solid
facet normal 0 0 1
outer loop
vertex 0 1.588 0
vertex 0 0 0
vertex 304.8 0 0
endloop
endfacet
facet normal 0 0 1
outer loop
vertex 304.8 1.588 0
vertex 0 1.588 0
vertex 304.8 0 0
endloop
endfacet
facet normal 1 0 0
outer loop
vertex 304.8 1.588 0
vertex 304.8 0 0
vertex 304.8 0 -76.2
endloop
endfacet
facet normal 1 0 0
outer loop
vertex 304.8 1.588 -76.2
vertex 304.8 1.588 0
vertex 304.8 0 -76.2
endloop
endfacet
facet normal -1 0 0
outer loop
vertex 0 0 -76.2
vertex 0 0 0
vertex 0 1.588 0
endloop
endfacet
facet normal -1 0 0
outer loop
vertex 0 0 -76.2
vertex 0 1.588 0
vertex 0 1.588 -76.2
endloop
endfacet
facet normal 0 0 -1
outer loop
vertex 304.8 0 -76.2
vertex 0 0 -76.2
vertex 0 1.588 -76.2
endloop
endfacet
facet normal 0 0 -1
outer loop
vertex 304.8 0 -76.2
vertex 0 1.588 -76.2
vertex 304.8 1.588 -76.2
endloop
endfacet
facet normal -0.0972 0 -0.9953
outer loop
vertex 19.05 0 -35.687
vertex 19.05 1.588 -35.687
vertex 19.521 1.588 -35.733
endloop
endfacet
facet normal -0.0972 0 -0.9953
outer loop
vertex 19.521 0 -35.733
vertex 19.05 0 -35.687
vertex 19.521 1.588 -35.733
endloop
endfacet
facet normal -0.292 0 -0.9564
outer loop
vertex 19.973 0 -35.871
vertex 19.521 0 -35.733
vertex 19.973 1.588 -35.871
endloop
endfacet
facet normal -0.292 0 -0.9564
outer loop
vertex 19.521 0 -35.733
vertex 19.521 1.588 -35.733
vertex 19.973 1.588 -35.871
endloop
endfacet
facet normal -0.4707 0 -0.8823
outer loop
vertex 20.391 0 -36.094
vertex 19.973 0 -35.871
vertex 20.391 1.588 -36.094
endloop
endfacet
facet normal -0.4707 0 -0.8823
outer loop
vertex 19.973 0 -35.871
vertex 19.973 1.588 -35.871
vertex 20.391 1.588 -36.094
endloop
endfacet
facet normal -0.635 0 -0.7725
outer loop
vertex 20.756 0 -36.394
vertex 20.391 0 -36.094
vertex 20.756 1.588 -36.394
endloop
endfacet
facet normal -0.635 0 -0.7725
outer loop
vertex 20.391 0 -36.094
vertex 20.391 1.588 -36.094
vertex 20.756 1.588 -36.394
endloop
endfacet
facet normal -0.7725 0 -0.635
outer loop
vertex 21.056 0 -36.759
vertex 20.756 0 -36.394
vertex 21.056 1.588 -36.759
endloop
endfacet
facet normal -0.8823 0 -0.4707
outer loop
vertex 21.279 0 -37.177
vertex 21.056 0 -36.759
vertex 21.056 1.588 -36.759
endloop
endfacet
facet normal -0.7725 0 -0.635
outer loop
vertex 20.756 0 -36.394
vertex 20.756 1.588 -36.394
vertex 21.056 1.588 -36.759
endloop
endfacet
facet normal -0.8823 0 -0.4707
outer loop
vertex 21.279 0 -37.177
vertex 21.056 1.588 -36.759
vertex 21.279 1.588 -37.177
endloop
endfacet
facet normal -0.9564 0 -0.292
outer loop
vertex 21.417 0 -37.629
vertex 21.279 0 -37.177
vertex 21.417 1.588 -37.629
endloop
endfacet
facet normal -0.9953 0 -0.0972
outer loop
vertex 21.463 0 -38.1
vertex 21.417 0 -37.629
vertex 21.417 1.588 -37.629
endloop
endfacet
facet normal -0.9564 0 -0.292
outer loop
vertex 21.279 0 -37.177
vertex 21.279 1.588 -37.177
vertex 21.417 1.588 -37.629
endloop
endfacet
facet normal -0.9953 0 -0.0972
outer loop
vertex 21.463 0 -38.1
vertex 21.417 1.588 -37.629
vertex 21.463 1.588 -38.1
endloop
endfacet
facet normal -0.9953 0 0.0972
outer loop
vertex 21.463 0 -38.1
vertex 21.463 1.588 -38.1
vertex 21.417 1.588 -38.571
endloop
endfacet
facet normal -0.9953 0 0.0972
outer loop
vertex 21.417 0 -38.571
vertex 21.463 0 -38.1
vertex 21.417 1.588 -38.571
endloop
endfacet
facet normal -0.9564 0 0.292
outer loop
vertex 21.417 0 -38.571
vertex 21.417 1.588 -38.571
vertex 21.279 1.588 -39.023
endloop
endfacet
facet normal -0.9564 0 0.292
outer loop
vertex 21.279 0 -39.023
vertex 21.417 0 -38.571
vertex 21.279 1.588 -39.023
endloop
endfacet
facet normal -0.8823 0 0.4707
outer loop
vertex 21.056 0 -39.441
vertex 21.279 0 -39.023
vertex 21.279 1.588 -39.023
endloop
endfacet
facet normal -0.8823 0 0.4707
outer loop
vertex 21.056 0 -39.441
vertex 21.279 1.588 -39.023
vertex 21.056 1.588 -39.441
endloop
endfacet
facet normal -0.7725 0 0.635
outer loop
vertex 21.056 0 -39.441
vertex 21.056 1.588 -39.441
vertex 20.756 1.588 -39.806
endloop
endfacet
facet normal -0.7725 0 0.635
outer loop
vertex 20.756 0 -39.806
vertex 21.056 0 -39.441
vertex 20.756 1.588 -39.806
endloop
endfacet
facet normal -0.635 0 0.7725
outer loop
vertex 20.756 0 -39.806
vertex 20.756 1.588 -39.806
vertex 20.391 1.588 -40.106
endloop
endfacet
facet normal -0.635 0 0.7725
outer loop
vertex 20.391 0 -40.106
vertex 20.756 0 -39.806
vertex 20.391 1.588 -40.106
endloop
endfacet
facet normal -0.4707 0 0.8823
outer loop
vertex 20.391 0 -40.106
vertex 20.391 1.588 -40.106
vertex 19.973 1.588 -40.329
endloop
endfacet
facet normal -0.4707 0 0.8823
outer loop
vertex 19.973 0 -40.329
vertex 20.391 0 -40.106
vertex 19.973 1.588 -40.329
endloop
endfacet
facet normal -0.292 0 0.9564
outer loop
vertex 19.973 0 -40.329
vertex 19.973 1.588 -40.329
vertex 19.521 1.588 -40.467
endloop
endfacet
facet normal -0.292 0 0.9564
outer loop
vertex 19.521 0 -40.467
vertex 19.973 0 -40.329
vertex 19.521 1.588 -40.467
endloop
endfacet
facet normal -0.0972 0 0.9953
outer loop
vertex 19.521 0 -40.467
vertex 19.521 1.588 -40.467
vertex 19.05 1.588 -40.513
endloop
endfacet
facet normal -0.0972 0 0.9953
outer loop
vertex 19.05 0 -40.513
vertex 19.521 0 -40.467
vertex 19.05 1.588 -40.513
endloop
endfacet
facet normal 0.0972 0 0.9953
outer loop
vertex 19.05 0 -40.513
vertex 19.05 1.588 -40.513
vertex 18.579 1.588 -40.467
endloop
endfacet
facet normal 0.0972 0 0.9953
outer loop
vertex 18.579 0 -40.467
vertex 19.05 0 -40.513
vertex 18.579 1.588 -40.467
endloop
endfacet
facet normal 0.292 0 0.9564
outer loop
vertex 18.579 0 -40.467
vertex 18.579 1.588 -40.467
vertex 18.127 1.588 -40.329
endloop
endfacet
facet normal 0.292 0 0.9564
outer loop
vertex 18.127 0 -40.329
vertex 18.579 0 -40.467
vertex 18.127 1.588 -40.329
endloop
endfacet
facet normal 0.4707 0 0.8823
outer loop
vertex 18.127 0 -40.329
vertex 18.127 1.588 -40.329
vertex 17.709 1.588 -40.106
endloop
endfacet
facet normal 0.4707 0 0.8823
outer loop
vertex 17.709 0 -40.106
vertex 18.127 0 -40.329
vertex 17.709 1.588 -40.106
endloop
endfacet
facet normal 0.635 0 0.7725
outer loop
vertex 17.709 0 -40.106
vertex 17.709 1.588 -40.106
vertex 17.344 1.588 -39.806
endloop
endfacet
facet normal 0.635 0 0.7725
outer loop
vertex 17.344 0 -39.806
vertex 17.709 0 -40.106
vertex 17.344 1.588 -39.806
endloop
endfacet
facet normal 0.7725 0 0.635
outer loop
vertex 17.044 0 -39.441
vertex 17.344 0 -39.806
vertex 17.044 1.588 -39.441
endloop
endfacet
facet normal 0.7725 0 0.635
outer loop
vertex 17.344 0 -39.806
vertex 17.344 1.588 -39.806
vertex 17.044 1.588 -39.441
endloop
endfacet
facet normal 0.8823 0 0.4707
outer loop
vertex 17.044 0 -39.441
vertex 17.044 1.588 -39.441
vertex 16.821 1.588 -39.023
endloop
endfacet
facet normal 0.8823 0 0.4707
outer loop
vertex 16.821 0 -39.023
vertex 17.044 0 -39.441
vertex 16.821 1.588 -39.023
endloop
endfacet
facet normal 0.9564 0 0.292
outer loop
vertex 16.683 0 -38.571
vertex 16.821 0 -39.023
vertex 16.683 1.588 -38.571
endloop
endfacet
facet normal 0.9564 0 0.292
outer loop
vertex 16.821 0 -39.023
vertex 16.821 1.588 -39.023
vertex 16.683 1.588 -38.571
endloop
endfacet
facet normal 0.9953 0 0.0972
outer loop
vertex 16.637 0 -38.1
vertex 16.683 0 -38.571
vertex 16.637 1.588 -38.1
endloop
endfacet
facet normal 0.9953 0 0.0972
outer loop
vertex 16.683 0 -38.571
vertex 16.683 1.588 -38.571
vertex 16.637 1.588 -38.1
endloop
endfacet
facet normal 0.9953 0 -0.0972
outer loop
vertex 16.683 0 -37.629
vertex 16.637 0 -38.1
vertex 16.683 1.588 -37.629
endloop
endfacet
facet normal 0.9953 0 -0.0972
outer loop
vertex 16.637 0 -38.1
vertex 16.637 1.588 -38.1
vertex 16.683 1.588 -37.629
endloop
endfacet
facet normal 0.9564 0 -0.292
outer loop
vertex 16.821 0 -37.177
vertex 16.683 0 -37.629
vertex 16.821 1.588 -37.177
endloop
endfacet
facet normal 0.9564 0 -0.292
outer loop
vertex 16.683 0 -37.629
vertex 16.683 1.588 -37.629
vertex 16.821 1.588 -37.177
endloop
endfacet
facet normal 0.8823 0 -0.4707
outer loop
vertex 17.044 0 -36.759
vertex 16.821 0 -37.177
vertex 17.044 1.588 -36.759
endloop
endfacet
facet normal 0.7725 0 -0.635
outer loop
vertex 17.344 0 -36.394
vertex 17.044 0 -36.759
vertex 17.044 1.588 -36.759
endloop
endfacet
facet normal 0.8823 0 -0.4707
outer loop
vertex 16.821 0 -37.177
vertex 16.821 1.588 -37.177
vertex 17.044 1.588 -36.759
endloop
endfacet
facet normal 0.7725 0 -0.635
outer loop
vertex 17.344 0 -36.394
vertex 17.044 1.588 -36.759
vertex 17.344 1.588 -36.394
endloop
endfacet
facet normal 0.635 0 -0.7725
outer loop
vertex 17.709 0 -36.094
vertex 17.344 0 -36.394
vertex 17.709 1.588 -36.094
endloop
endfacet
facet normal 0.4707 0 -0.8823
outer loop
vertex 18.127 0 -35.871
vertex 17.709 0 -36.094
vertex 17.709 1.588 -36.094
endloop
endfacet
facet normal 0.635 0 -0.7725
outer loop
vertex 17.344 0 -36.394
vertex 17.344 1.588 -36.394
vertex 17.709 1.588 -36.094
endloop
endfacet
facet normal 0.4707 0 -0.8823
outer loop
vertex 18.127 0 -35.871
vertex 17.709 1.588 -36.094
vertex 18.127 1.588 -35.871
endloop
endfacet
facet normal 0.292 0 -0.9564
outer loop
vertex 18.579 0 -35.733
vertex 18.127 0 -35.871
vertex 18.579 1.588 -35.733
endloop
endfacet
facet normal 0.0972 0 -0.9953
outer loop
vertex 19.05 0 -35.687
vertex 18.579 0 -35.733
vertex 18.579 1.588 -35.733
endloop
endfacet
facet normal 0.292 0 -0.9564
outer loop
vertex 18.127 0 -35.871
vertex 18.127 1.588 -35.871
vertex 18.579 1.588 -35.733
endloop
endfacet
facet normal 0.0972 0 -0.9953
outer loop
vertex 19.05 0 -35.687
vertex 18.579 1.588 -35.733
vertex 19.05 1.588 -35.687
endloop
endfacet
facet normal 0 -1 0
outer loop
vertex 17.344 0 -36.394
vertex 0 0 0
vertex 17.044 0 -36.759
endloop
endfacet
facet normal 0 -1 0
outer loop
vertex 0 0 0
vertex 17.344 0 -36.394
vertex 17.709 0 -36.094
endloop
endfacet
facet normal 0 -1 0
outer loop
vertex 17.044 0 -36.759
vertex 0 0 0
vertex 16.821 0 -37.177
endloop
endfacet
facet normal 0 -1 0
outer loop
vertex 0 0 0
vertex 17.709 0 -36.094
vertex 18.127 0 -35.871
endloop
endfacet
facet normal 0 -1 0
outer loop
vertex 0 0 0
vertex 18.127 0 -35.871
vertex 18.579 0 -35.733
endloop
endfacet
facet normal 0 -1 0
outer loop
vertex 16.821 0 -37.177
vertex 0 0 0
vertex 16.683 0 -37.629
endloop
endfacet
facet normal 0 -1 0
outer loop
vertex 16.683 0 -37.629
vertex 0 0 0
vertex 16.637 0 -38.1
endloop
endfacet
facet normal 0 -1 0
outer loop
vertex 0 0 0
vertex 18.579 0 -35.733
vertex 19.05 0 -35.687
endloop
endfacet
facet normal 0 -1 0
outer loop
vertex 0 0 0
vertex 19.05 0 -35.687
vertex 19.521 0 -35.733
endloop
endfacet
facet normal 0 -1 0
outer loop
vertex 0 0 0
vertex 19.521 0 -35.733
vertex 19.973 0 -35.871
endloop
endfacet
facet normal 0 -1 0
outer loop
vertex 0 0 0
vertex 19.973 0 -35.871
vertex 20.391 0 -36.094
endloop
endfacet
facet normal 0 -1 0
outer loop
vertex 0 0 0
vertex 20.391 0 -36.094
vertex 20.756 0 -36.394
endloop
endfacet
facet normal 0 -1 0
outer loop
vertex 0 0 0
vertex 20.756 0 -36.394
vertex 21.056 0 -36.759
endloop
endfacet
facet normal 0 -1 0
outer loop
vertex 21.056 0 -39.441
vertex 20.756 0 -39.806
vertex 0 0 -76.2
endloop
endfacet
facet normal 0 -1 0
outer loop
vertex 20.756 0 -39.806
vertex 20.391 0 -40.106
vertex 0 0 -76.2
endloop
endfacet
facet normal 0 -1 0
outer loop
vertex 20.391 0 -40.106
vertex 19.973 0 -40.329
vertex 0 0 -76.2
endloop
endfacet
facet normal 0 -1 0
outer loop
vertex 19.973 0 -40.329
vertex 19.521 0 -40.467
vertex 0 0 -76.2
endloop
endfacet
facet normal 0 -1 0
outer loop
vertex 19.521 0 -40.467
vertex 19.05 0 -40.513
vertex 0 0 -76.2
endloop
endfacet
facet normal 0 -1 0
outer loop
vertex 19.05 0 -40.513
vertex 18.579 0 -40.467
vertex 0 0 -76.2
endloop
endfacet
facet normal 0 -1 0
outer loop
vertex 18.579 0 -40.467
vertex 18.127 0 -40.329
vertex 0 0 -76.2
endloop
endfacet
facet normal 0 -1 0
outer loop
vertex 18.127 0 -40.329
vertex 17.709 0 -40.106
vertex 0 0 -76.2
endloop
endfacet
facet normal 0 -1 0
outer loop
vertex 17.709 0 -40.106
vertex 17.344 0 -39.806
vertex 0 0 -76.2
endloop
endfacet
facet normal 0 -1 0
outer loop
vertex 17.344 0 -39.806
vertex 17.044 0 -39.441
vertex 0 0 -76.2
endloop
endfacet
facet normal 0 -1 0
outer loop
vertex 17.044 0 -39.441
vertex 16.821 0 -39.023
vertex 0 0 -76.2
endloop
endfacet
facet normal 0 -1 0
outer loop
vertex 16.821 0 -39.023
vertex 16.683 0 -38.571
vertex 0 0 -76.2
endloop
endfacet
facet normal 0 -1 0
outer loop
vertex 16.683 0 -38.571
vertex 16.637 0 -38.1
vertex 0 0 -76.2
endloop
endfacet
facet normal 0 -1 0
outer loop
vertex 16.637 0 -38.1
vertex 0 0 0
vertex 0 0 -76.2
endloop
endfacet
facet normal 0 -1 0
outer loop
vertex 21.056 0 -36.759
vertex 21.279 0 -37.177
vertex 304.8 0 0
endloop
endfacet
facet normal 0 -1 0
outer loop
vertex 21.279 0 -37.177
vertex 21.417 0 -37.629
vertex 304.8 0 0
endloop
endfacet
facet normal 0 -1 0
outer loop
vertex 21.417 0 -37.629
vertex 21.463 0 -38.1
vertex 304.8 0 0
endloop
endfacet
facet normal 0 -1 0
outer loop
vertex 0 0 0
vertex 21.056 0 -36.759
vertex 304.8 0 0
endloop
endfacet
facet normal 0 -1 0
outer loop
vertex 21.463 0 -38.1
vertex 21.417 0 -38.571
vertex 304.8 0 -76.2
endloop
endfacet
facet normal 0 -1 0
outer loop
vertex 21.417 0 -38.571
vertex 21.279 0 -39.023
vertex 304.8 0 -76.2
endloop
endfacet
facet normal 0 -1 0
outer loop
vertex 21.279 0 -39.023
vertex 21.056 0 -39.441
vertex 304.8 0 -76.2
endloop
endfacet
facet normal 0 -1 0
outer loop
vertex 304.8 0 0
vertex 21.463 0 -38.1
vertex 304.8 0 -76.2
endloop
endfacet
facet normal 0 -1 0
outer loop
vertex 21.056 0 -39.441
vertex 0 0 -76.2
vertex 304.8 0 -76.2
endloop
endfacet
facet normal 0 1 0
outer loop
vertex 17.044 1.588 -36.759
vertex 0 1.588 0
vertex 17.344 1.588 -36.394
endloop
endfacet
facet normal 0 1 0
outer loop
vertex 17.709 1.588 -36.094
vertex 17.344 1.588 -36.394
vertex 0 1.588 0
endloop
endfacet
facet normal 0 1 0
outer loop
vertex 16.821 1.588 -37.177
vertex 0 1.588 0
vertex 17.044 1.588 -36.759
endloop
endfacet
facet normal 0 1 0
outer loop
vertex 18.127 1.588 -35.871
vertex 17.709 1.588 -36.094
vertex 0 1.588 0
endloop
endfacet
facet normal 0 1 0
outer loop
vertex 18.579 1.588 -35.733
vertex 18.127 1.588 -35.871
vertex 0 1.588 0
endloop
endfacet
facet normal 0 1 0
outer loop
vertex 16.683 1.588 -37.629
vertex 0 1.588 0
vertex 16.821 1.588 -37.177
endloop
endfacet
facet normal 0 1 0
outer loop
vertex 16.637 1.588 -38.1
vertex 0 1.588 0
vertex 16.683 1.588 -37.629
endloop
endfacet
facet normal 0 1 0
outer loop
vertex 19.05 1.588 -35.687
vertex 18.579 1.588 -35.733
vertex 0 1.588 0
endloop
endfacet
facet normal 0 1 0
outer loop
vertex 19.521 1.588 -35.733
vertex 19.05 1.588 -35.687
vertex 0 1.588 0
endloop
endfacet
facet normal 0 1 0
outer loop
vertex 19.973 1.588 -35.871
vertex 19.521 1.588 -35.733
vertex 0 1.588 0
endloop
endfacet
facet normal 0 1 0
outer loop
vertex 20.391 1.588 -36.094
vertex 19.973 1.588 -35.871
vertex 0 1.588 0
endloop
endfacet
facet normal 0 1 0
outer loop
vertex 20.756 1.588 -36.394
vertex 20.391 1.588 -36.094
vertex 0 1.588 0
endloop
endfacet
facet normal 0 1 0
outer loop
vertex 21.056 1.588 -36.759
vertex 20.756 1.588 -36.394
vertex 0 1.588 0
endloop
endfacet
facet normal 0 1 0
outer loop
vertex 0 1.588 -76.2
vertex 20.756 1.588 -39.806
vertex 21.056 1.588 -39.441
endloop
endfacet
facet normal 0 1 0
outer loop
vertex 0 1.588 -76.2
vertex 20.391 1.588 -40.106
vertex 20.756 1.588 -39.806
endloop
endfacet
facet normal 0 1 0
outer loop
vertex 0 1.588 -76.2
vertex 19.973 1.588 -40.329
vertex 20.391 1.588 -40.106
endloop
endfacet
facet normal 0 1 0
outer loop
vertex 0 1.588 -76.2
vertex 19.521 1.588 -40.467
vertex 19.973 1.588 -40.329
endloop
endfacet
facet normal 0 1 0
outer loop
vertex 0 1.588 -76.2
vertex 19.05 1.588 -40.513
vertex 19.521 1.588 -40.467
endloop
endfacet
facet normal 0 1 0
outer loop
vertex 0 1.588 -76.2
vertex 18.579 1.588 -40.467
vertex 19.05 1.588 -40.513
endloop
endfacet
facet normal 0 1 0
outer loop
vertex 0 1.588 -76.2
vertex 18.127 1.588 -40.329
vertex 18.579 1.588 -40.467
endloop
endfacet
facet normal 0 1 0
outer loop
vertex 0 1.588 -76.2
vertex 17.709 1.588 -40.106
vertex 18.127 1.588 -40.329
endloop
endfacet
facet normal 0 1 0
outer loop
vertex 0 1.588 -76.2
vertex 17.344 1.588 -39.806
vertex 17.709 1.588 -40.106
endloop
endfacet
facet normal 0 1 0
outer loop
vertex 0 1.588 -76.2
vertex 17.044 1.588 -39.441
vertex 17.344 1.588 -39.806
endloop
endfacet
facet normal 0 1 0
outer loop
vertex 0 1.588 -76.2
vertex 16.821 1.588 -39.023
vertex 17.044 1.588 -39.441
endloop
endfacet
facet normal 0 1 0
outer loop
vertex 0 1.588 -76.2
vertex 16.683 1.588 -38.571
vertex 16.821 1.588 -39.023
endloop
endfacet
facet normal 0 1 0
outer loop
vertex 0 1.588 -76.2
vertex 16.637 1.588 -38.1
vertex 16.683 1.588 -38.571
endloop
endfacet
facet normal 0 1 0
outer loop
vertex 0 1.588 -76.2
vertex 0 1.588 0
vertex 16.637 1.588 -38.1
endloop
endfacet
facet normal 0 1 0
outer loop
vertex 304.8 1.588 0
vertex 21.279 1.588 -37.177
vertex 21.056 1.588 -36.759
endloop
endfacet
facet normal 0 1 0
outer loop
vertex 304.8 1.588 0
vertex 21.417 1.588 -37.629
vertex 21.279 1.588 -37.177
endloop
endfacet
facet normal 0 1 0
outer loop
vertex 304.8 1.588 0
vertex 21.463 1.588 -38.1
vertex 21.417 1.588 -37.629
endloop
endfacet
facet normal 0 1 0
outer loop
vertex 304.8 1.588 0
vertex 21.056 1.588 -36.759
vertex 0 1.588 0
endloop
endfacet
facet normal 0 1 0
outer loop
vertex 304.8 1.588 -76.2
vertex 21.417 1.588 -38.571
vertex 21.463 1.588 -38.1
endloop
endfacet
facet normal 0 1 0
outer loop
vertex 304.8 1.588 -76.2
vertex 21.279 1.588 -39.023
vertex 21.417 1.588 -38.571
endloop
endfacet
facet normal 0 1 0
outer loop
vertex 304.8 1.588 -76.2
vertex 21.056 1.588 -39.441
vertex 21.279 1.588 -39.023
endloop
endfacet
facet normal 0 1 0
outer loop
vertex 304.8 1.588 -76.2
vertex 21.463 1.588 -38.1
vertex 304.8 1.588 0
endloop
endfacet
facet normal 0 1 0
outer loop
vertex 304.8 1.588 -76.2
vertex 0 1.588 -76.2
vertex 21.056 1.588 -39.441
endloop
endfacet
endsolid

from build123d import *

# Parameters (mm, degrees)
SKETCH1_W            = 304.8
SKETCH1_H            = 76.2
ELECTRODE_BASE_DEPTH = 1.5875
SKETCH2_R            = 2.413
CUT_EXTRUDE1_DEPTH   = 315.184659327


with BuildPart() as part:
    # Sketch1 → Electrode Base (new body)
    with BuildSketch(Plane(origin=(0, 0, 0), x_dir=(1, 0, 0), z_dir=(0, 1, 0))):
        with Locations((152.4, 38.1)):
            Rectangle(SKETCH1_W, SKETCH1_H)
    extrude(amount=ELECTRODE_BASE_DEPTH)

    # Sketch2 → Cut-Extrude1 (cut, through all)
    with BuildSketch(Plane(origin=(0, 1.5875, 0), x_dir=(1, 0, 0), z_dir=(0, 1, 0))):
        with Locations(Location((19.05, 38.1, 0), (0, 0, 270))):
            Circle(SKETCH2_R)
    extrude(amount=-CUT_EXTRUDE1_DEPTH, mode=Mode.SUBTRACT)


solid = part.part
